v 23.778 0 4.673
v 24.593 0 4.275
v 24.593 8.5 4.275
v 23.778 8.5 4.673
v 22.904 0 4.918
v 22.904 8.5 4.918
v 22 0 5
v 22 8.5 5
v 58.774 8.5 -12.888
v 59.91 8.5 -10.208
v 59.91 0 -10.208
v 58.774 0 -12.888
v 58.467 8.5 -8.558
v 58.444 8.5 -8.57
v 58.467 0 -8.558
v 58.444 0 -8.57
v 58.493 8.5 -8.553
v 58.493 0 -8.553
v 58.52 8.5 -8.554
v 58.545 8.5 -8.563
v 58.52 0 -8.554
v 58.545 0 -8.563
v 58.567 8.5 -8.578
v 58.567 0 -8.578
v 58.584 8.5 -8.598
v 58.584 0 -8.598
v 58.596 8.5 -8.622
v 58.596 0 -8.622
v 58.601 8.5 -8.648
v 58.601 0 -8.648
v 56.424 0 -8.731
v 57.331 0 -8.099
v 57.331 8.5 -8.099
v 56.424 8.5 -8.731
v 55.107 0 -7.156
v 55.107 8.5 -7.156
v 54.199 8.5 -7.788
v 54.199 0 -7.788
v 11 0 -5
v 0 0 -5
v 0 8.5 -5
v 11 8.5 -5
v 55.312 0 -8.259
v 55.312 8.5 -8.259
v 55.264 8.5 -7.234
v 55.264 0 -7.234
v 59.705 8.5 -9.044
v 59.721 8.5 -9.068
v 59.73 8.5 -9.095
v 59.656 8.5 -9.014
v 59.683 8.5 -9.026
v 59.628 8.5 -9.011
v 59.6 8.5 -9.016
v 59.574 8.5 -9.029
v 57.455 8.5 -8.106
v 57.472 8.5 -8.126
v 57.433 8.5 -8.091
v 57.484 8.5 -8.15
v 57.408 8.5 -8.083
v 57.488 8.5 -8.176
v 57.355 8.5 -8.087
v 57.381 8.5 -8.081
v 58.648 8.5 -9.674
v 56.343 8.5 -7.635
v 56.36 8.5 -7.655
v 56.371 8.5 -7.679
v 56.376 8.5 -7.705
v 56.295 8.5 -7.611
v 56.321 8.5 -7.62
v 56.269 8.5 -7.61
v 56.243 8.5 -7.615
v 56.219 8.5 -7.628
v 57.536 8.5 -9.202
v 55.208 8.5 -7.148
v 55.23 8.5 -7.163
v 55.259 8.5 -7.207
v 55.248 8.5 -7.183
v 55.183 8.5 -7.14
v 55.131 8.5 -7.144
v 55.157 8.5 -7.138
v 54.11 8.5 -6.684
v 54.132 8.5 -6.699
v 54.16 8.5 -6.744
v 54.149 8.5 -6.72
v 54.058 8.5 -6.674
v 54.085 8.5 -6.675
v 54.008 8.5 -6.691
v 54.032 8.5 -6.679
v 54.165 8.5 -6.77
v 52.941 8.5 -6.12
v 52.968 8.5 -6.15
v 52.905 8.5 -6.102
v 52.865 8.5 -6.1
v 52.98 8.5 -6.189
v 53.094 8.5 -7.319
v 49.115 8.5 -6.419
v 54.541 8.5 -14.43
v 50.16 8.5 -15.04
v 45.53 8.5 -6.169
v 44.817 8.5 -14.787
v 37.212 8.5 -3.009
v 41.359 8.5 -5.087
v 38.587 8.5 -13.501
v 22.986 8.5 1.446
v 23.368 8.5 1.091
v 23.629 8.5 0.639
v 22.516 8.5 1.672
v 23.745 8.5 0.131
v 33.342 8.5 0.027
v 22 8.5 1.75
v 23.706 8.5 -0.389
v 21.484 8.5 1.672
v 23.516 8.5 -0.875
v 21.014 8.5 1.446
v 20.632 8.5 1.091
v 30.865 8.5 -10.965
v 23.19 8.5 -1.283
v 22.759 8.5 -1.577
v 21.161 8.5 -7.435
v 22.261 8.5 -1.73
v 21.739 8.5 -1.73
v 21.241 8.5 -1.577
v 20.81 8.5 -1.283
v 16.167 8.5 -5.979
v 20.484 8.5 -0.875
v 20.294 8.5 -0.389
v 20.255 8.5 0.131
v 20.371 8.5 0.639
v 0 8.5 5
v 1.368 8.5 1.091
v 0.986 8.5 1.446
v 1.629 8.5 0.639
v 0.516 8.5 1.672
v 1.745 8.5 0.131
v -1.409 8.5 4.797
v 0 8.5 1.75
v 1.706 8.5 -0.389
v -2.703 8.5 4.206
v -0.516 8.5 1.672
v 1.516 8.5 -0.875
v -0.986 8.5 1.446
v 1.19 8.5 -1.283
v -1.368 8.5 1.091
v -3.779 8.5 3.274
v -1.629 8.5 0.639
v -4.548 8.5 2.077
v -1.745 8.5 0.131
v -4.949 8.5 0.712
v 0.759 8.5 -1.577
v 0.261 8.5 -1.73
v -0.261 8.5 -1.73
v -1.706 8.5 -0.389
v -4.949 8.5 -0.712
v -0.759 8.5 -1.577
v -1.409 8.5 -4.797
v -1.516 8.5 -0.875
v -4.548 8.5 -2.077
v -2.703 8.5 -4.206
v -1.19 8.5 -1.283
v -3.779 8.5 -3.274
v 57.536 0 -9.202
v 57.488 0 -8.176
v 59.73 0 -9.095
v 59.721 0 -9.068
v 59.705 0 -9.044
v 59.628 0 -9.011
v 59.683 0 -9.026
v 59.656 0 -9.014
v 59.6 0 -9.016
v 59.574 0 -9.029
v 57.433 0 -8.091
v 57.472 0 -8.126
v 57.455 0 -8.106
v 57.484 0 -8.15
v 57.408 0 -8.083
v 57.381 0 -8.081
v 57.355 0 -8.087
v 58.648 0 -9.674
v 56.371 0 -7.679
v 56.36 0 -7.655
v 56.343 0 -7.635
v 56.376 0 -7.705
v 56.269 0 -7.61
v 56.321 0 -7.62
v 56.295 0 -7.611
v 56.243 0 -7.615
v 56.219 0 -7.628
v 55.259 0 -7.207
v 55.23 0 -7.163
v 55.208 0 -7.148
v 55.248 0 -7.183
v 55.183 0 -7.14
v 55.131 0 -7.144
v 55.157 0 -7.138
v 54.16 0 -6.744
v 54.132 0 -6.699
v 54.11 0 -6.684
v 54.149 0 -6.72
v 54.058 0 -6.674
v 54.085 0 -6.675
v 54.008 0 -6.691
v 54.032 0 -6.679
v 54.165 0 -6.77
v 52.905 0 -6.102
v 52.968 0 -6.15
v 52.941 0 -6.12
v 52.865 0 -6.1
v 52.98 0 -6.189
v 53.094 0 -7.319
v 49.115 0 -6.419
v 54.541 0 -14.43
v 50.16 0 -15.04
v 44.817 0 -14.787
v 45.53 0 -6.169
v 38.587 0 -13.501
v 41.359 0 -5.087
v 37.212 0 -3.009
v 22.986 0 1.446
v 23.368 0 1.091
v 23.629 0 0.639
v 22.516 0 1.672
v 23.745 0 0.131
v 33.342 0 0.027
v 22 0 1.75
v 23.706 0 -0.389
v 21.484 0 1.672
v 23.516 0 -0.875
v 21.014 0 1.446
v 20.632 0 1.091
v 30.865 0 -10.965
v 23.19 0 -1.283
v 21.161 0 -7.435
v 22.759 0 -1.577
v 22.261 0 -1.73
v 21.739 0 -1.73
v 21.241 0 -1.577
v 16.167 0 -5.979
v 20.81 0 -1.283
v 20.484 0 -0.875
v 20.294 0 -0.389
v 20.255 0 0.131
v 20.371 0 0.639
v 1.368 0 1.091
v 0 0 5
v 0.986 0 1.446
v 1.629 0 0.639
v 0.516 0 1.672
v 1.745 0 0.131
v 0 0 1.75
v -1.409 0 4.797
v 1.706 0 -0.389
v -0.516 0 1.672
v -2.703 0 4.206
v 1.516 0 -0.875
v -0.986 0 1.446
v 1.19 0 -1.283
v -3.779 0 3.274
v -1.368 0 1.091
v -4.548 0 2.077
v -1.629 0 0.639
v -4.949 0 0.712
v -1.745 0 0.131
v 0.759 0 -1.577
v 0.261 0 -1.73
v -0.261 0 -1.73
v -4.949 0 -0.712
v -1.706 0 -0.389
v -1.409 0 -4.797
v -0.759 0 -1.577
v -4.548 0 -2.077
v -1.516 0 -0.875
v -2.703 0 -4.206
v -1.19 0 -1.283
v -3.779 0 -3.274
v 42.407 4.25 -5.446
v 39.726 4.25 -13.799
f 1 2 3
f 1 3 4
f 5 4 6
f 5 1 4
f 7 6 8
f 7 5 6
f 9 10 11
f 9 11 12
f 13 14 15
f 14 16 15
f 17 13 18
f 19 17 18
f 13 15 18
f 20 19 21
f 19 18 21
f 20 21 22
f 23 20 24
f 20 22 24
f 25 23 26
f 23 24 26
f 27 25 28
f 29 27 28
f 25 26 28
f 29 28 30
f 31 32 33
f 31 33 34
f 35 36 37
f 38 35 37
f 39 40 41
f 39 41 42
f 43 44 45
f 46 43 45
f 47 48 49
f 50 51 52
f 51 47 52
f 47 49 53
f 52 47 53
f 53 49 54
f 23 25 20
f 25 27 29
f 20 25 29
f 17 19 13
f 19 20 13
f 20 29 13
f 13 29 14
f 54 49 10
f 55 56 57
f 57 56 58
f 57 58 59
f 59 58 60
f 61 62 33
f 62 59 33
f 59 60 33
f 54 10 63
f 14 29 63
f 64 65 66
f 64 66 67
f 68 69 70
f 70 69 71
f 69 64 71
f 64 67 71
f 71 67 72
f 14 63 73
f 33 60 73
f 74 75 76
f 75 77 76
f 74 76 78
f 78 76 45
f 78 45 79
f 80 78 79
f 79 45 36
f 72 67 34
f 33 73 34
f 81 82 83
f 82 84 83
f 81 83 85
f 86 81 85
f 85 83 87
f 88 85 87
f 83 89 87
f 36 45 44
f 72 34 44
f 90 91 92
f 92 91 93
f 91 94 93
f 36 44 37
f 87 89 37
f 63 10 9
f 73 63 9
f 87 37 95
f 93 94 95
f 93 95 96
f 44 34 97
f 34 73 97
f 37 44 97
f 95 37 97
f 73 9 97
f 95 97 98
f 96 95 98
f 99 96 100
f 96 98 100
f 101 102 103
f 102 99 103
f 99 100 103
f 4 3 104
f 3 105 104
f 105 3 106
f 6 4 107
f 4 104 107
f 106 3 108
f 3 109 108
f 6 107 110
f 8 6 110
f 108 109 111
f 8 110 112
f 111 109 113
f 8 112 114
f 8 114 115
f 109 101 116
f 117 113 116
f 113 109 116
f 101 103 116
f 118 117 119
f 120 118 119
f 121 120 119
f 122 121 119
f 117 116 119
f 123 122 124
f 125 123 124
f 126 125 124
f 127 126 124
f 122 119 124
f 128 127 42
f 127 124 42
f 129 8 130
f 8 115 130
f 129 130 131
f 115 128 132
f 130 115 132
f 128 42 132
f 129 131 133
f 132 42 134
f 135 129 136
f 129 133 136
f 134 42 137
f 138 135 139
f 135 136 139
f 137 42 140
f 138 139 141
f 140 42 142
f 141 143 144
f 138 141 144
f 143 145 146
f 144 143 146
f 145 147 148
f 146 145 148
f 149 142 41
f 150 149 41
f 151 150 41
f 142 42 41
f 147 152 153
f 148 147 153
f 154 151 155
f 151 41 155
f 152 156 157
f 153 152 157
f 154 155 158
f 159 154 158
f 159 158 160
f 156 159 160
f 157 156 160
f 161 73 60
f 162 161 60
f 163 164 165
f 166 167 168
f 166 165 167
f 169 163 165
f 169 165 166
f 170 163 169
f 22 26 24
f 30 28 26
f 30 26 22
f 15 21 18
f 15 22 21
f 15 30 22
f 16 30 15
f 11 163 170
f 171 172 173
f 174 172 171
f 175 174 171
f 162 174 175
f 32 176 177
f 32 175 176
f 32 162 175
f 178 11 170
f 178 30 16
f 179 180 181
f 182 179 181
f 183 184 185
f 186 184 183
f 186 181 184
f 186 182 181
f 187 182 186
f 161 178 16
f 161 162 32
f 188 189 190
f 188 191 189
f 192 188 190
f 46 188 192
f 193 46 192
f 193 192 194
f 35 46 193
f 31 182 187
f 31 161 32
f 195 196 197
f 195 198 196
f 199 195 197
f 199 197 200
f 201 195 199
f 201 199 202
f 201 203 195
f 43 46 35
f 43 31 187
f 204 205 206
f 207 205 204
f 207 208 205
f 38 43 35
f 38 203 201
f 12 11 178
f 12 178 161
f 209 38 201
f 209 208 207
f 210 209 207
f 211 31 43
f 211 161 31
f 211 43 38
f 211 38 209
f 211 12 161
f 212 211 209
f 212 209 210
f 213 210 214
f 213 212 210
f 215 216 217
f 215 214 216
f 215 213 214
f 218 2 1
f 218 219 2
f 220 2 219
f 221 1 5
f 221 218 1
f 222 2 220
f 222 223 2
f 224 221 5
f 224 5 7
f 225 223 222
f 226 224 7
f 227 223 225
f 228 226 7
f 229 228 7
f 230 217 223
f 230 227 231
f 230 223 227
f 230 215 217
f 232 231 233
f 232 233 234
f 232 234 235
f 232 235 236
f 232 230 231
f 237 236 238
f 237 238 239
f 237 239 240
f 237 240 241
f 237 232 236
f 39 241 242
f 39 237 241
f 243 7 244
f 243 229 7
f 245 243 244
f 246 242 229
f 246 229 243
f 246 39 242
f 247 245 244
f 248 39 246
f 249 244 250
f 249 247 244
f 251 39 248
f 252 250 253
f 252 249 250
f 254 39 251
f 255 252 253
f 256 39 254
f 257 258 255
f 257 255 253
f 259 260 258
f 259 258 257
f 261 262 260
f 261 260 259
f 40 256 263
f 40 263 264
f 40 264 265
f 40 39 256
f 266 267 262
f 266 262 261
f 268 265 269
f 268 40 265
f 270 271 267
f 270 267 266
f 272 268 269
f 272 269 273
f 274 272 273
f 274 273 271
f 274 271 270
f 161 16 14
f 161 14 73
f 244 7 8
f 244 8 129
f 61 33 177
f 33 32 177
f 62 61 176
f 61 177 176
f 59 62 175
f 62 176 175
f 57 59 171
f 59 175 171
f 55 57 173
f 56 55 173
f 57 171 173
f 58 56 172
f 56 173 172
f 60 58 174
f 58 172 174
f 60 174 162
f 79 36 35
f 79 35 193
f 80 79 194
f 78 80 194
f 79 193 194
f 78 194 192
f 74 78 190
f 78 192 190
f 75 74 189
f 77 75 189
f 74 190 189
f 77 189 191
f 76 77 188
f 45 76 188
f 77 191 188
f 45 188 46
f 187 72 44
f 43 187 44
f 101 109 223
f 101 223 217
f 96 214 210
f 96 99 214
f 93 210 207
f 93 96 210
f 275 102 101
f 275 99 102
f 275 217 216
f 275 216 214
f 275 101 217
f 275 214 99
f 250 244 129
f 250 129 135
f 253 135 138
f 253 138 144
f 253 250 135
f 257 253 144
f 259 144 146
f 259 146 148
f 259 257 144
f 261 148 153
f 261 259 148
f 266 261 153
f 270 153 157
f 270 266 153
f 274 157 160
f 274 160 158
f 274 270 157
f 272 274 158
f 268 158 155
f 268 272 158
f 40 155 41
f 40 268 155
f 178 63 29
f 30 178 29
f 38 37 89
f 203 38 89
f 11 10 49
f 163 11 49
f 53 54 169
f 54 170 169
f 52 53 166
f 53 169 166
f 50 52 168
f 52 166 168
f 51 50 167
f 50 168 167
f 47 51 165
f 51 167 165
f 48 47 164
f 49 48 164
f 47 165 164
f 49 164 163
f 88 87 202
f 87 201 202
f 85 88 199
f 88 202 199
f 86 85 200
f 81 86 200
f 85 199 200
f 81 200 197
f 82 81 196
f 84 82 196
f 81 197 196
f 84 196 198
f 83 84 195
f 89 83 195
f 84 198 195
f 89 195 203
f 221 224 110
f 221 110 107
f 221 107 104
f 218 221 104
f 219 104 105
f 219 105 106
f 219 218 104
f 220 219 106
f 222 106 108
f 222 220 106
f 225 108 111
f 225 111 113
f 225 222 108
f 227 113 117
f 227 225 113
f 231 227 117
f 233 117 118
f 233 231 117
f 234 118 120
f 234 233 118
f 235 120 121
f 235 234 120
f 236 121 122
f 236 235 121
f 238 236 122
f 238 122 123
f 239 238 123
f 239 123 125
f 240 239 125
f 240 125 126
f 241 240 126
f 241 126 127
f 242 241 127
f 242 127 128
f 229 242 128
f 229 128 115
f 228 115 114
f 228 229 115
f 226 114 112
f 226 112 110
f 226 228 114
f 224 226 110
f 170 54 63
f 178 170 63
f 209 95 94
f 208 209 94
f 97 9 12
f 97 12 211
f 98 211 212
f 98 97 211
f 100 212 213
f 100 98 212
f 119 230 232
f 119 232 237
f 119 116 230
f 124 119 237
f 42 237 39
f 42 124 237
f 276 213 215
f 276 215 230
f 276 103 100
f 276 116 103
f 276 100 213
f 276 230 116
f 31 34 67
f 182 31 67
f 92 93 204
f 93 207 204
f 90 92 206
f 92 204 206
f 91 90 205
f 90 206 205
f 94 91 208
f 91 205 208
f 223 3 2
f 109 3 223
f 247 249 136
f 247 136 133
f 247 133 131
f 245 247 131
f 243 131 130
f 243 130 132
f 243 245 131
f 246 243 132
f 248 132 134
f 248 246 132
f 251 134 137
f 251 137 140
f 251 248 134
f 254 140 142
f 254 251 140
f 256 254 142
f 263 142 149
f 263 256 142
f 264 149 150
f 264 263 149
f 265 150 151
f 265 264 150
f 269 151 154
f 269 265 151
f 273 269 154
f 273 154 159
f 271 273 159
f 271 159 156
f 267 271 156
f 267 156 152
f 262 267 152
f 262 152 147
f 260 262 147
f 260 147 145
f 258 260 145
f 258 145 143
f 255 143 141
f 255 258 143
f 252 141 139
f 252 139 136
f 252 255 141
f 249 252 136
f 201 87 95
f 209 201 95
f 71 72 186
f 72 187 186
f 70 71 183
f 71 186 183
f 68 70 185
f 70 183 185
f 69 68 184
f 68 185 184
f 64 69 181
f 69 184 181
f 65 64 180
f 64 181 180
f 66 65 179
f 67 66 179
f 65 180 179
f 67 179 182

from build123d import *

# Parameters (mm, degrees)
SKETCH1_R           = 1.75
BOSS_EXTRUDE1_DEPTH = 8.5
BOSS_EXTRUDE2_DEPTH = 8.5
CUT_EXTRUDE1_DEPTH  = 8.5
FILLET1_R           = 0.1


with BuildPart() as part:
    # Sketch1 → Boss-Extrude1 (new body)
    with BuildSketch(Plane(origin=(0, 0, 0), x_dir=(1, 0, 0), z_dir=(0, 1, 0))):
        with BuildLine():
            Line((0, 5), (22, 5))
            ThreePointArc((22, 5), (27, 0), (22, -5))
            Line((22, -5), (0, -5))
            ThreePointArc((0, -5), (-5, 0), (0, 5))
        make_face()
        with Locations(Location((0, 0, 0), (0, 0, 270))):
            Circle(SKETCH1_R, mode=Mode.SUBTRACT)
        with Locations(Location((22, 0, 0), (0, 0, 270))):
            Circle(SKETCH1_R, mode=Mode.SUBTRACT)
    extrude(amount=BOSS_EXTRUDE1_DEPTH)

    # Sketch2 → Boss-Extrude2 (add)
    with BuildSketch(Plane(origin=(0, 8.5, 0), x_dir=(1, 0, 0), z_dir=(0, 1, 0))):
        with BuildLine():
            Line((24.179012082, -4.476059884), (33.341557569, -0.026966843))
            add(Edge.make_bspline(
                [(33.341557569, -0.026966843), (41.749820473, 7.89313442), (52.969012082, 6.083442161)],
                knots=[0, 0, 0, 1, 1, 1], degree=2))
            Line((52.969012082, 6.083442161), (60.334686591, 9.205434959))
            Line((60.334686591, 9.205434959), (58.773690192, 12.888272213))
            add(Edge.make_bspline(
                [(58.773690192, 12.888272213), (52.774224243, 15.890799399), (35.603615653, 14.597846237), (21.152761079, 6.296000311), (11, 5)],
                knots=[0, 0, 0, 0, 0.392136184, 1, 1, 1, 1], degree=3))
            Line((11, 5), (22, 5))
            ThreePointArc((22, 5), (26.8616817, 1.129378711), (24.179012082, -4.476059884))
        make_face()
    extrude(amount=-BOSS_EXTRUDE2_DEPTH)

    # Sketch3 → Cut-Extrude1 (cut)
    with BuildSketch(Plane(origin=(0, 8.5, 0), x_dir=(1, 0, 0), z_dir=(0, 1, 0))):
        Polygon((53.093613314, 7.319249743), (52.969012082, 6.083442161), (54.158655304, 6.587680784), align=None)
        Polygon((54.199304069, 7.787904524), (54.158655304, 6.587680784), (55.255605115, 7.052630654), align=None)
        Polygon((55.31150405, 8.259318286), (55.255605115, 7.052630654), (56.367805096, 7.524044416), align=None)
        Polygon((56.423704031, 8.730732048), (56.367805096, 7.524044416), (57.480005077, 7.995458178), align=None)
        Polygon((57.535904012, 9.202145811), (57.480005077, 7.995458178), (58.592205058, 8.46687194), align=None)
        Polygon((58.648103993, 9.673559573), (58.592205058, 8.46687194), (59.704405039, 8.938285702), align=None)
        Polygon((59.909629601, 10.208266049), (59.704405039, 8.938285702), (60.334686591, 9.205434959), align=None)
    extrude(amount=-CUT_EXTRUDE1_DEPTH, mode=Mode.SUBTRACT)

    # Fillet1
    fillet1_edges = [part.edges().sort_by_distance(p)[0] for p in [
        (57.480005077, 4.25, -7.995458178),
        (59.704405039, 4.25, -8.938285702),
        (52.969012082, 4.25, -6.083442161),
        (54.158655304, 4.25, -6.587680784),
        (56.367805096, 4.25, -7.524044416),
        (58.592205058, 4.25, -8.46687194),
        (55.255605115, 4.25, -7.052630654),
    ]]
    fillet(fillet1_edges, radius=FILLET1_R)


solid = part.part
